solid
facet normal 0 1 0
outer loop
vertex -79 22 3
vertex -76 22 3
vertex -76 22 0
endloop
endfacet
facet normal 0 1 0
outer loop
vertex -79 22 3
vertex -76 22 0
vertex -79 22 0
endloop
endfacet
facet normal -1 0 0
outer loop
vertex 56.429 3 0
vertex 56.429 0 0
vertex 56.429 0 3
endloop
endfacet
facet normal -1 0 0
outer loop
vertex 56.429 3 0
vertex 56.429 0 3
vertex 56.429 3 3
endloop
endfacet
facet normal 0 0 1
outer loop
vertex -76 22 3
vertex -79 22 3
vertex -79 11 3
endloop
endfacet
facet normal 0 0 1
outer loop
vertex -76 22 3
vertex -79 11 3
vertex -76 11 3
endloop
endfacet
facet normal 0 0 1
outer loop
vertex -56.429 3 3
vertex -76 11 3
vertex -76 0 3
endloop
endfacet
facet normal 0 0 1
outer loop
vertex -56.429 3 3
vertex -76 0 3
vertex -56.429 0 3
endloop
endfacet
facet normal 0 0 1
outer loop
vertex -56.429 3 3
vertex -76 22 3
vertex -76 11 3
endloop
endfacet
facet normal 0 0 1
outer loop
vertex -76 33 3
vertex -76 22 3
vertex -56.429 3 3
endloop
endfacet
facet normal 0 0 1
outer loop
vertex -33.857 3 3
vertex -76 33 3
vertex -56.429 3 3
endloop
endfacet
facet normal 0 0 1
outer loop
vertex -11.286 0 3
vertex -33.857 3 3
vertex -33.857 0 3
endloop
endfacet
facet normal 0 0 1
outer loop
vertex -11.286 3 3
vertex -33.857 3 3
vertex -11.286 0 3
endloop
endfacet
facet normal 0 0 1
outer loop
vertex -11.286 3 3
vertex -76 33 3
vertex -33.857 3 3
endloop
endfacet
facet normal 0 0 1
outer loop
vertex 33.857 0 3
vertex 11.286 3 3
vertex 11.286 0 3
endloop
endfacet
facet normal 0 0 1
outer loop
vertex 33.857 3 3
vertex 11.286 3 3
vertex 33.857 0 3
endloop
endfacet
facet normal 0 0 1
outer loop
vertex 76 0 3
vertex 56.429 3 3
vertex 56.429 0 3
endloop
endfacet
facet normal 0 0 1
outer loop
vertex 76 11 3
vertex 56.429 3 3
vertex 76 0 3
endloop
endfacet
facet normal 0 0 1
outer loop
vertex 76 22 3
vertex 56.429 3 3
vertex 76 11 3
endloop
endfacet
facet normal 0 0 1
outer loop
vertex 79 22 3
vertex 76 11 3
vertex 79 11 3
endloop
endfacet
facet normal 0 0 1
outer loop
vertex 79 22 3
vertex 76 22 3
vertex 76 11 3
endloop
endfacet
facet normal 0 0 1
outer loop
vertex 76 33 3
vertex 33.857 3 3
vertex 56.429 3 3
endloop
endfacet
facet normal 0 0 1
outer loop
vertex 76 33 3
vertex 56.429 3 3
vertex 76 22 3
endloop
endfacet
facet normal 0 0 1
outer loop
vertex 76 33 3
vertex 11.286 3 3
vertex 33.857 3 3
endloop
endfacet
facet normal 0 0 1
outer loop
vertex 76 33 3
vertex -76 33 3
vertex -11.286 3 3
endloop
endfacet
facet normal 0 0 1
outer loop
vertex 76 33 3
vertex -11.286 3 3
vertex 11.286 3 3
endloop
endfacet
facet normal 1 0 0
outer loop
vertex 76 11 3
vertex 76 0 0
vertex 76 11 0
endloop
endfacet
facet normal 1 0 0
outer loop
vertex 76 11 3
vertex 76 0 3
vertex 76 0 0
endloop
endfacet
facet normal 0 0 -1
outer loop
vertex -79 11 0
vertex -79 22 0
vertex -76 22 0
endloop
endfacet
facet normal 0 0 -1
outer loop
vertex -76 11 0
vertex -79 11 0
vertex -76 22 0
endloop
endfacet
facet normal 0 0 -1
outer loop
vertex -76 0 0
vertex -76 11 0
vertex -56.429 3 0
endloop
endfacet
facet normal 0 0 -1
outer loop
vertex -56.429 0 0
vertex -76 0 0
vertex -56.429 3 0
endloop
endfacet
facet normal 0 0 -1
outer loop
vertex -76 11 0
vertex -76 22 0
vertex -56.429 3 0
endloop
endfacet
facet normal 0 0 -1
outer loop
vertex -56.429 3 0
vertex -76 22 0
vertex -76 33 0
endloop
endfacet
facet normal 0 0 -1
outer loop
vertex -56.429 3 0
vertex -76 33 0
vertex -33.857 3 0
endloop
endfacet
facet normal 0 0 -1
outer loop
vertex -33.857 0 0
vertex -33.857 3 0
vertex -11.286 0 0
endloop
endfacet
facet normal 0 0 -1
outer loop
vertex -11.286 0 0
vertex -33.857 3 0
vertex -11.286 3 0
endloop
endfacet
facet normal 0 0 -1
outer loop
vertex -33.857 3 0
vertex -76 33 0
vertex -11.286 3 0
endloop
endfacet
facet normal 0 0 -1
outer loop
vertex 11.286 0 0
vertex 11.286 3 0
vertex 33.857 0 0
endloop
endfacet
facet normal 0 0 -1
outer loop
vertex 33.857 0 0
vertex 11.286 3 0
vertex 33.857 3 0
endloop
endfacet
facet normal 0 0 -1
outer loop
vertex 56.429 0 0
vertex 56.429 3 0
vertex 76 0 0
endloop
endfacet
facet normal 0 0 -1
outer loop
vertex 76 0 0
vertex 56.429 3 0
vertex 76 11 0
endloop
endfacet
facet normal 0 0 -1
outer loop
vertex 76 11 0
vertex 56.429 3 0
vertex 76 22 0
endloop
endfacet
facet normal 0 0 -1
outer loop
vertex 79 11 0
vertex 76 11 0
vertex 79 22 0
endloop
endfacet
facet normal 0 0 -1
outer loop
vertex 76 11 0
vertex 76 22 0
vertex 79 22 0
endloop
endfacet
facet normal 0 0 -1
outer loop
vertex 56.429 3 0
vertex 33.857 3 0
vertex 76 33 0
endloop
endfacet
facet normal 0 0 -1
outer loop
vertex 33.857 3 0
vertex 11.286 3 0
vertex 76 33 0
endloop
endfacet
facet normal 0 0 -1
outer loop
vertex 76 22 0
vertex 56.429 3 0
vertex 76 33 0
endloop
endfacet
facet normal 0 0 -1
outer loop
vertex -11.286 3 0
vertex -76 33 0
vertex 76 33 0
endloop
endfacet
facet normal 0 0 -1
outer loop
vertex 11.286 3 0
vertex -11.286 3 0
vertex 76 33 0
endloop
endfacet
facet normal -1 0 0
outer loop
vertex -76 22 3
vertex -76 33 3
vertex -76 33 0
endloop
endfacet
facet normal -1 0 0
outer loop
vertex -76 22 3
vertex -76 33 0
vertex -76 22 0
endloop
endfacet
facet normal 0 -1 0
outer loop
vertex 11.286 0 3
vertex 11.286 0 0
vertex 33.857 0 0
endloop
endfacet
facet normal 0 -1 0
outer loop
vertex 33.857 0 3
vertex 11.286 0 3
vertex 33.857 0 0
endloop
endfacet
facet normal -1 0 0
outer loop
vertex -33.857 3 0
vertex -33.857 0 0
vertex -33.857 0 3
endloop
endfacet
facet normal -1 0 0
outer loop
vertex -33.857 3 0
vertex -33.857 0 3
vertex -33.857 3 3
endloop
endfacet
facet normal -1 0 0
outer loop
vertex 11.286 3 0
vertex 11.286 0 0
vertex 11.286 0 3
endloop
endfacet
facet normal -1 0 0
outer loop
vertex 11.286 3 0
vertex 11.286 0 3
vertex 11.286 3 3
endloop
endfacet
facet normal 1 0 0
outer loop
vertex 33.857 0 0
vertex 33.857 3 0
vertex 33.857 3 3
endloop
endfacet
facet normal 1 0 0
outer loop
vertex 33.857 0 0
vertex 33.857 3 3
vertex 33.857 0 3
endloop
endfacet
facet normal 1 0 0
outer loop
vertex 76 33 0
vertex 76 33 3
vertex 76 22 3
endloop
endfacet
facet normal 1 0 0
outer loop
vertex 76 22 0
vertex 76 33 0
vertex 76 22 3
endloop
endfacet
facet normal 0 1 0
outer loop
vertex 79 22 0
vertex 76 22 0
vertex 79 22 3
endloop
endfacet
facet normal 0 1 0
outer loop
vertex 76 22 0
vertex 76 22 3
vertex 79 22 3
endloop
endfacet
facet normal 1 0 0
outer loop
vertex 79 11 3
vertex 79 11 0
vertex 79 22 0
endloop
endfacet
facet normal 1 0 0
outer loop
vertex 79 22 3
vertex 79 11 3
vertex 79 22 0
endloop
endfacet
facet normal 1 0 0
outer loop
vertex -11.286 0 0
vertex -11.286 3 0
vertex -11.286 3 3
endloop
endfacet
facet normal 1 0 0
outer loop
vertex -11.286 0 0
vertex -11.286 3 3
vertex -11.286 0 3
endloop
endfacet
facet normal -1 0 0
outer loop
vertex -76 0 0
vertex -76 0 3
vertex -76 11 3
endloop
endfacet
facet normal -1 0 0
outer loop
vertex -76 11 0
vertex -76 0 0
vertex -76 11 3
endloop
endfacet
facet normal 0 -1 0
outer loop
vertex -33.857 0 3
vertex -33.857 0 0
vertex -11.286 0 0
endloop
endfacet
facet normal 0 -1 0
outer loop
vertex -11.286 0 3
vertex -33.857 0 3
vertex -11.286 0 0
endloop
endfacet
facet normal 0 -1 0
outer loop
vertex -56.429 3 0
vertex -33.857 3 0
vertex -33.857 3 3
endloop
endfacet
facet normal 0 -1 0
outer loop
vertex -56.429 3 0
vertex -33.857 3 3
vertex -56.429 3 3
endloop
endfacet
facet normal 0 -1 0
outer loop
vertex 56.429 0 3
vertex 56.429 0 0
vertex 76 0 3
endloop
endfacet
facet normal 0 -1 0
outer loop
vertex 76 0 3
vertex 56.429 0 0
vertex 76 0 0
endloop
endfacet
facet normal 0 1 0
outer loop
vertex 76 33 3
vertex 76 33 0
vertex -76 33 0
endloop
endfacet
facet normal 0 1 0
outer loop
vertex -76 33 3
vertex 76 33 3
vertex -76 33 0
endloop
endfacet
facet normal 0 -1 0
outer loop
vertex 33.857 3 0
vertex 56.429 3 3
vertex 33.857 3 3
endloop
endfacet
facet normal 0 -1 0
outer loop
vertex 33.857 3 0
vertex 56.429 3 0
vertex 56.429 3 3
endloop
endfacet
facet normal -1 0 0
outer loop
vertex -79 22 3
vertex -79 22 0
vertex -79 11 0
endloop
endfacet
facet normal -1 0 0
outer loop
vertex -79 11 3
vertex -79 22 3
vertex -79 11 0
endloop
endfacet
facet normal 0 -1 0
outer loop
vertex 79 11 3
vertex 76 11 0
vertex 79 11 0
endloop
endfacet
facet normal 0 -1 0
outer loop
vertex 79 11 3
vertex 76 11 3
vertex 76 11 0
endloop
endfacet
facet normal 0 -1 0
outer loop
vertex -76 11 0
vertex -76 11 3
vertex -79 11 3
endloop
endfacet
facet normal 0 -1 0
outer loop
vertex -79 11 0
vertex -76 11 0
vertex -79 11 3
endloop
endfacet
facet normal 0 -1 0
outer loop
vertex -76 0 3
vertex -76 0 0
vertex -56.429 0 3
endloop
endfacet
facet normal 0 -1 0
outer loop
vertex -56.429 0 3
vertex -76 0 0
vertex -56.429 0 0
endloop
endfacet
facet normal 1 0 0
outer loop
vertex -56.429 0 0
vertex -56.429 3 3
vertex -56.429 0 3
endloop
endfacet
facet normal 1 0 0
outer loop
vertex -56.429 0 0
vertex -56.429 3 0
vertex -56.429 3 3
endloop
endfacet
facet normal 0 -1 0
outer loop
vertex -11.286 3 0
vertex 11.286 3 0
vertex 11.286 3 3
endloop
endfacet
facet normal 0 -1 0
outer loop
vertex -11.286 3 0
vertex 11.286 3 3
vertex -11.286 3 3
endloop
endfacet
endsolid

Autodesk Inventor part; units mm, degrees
ref_plane "YZ Plane" through (0, 0, 0) normal (1, 0, 0) x (0, 1, 0)
ref_plane "XZ Plane" through (0, 0, 0) normal (0, 1, 0) x (-1, 0, 0)
ref_plane "XY Plane" through (0, 0, 0) normal (0, 0, 1) x (1, 0, 0)
sketch "Sketch1" plane through (0, 0, 0) normal (0, 0, 1) x (1, 0, 0)
  line L0 (-33.8571, 0) -> (-33.8571, 3)
  line L1 (-33.8571, 3) -> (-56.4286, 3)
  line L2 (-56.4286, 3) -> (-56.4286, 0)
  line L3 (11.2857, 0) -> (11.2857, 3)
  line L4 (11.2857, 3) -> (-11.2857, 3)
  line L5 (-11.2857, 3) -> (-11.2857, 0)
  line L6 (56.4286, 0) -> (56.4286, 3)
  line L7 (56.4286, 3) -> (33.8571, 3)
  line L8 (33.8571, 3) -> (33.8571, 0)
  line L9 (-79, 22) -> (-79, 22)
  line L10 (-79, 22) -> (-79, 11)
  line L11 (-79, 11) -> (-79, 11)
  line L12 (79, 11) -> (79, 11)
  line L13 (79, 11) -> (79, 22)
  line L14 (79, 22) -> (79, 22)
  line L15 (-56.4286, 33) -> (-79, 33)
  line L16 (79, 33) -> (56.4286, 33)
  line L17 (33.8571, 33) -> (11.2857, 33)
  line L18 (-11.2857, 33) -> (-33.8571, 33)
  line L19 (79, 0) -> (79, 11)
  line L20 (79, 22) -> (79, 33)
  line L21 (56.4286, 0) -> (79, 0)
  line L22 (11.2857, 0) -> (33.8571, 0)
  line L23 (-79, 0) -> (-56.4286, 0)
  line L24 (-33.8571, 0) -> (-11.2857, 0)
  line L25 (-79, 33) -> (-79, 22)
  line L26 (-79, 11) -> (-79, 0)
  line L27 (-56.4286, 33) -> (57.8569, 33)
  point P0 (0, 0)
  point P1 (0, 30)
  point P2 (52.5, 33)
  dimension "d46" = 158
  dimension "d48" = 33
  dimension "d49" = 79
  dimension "d50" = 0
  dimension "d53" = 0
  dimension "d58" = 11
  dimension "d59" = 11
  dimension "d61" = 22.5714
  dimension "d62" = 11.2857
  dimension "d63" = 0
  dimension "d64" = 0
  dimension "d65" = 3
extrude "Extrusion1" add sketch "Sketch1" along normal blind 3
sketch "Sketch3" plane through (0, 0, 3) normal (0, 0, 1) x (1, 0, 0)
  line L0 (-79, 33) -> (-79, 0) projected
  line L1 (-79, 33) -> (-76, 33)
  line L2 (-76, 33) -> (-76, 22)
  line L3 (-76, 22) -> (-79, 22)
  line L4 (-79, 22) -> (-79, 33)
  line L5 (-79, 0) -> (-56.4286, 0) projected
  line L6 (-79, 0) -> (-76, 0)
  line L7 (-76, 0) -> (-76, 11)
  line L8 (-76, 11) -> (-79, 11)
  line L9 (-79, 11) -> (-79, 0)
  line L10 (79, 33) -> (-79, 33) projected
  line L11 (79, 33) -> (76, 33)
  line L12 (76, 33) -> (76, 22)
  line L13 (76, 22) -> (79, 22)
  line L14 (79, 22) -> (79, 33)
  line L15 (79, 0) -> (79, 33) projected
  line L16 (79, 0) -> (76, 0)
  line L17 (76, 0) -> (76, 11)
  line L18 (76, 11) -> (79, 11)
  line L19 (79, 11) -> (79, 0)
  point P0 (0, 0)
  dimension "d66" = 11
  dimension "d67" = 3
extrude "Extrusion3" cut sketch "Sketch3" against normal through all
equation "\"d46\" = shelfWs"
equation "\"d48\" = shelfD"
equation "\"d49\" = 0.5 * shelfWs"
equation "\"d58\" = 0.333333 * shelfD - tol"
equation "\"d59\" = 0.333333 * shelfD + 2 * tol"
equation "\"d24\" = tt"
equation "\"d0\" = 0.5 * shelfWs"
equation "\"tt\" = 3"
equation "\"tol\" = 0"
equation "\"d2\" = shelfD"
equation "\"d4\" = tt"
equation "\"tiroir\" = 1"
equation "\"nHoles\" = 4"
equation "\"shelfH\" = 35"
equation "\"shelfWs\" = 158"
equation "\"d47\" = 0.5 * shelfWs"
equation "\"shelfD\" = 33"
properties part number "back"
